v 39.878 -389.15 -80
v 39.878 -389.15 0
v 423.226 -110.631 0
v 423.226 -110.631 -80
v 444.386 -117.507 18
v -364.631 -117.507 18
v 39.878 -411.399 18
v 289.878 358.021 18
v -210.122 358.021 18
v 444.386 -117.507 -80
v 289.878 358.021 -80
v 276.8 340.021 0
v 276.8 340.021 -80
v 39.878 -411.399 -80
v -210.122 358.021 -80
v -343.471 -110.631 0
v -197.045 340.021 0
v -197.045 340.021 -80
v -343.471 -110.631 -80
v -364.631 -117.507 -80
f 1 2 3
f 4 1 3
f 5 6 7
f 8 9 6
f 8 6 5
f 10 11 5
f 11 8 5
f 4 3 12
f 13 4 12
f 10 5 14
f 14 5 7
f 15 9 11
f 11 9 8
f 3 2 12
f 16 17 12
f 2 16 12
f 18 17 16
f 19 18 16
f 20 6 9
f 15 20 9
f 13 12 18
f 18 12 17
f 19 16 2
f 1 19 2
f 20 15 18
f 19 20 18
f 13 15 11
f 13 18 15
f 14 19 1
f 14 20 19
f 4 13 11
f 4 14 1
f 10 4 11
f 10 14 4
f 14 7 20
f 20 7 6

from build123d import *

# Parameters (mm, degrees)
F1_DEPTH = 18
F3_DEPTH = 80


with BuildPart() as f1:
    # F0 (on Top) → F1 (new body)
    with BuildSketch(Plane.XY):
        Polygon((444.386186, -117.506794), (289.877689, 358.021464), (-210.122311, 358.021464), (-364.630808, -117.506794), (39.877689, -411.39942), align=None)
    extrude(amount=F1_DEPTH)

    # F2 (on face) → F3 (join)
    with BuildSketch(Plane(origin=(0, 0, 0), x_dir=(1, 0, 0), z_dir=(0, 0, -1))):
        Polygon((-364.630808, 117.506794), (-210.122311, -358.021464), (289.877689, -358.021464), (444.386186, 117.506794), (39.877689, 411.39942), align=None)
        Polygon((276.799923, -340.021464), (-197.044546, -340.021464), (-343.470539, 110.631406), (39.877689, 389.150196), (423.225917, 110.631406), align=None, mode=Mode.SUBTRACT)
    extrude(amount=F3_DEPTH)


solid = f1.part
